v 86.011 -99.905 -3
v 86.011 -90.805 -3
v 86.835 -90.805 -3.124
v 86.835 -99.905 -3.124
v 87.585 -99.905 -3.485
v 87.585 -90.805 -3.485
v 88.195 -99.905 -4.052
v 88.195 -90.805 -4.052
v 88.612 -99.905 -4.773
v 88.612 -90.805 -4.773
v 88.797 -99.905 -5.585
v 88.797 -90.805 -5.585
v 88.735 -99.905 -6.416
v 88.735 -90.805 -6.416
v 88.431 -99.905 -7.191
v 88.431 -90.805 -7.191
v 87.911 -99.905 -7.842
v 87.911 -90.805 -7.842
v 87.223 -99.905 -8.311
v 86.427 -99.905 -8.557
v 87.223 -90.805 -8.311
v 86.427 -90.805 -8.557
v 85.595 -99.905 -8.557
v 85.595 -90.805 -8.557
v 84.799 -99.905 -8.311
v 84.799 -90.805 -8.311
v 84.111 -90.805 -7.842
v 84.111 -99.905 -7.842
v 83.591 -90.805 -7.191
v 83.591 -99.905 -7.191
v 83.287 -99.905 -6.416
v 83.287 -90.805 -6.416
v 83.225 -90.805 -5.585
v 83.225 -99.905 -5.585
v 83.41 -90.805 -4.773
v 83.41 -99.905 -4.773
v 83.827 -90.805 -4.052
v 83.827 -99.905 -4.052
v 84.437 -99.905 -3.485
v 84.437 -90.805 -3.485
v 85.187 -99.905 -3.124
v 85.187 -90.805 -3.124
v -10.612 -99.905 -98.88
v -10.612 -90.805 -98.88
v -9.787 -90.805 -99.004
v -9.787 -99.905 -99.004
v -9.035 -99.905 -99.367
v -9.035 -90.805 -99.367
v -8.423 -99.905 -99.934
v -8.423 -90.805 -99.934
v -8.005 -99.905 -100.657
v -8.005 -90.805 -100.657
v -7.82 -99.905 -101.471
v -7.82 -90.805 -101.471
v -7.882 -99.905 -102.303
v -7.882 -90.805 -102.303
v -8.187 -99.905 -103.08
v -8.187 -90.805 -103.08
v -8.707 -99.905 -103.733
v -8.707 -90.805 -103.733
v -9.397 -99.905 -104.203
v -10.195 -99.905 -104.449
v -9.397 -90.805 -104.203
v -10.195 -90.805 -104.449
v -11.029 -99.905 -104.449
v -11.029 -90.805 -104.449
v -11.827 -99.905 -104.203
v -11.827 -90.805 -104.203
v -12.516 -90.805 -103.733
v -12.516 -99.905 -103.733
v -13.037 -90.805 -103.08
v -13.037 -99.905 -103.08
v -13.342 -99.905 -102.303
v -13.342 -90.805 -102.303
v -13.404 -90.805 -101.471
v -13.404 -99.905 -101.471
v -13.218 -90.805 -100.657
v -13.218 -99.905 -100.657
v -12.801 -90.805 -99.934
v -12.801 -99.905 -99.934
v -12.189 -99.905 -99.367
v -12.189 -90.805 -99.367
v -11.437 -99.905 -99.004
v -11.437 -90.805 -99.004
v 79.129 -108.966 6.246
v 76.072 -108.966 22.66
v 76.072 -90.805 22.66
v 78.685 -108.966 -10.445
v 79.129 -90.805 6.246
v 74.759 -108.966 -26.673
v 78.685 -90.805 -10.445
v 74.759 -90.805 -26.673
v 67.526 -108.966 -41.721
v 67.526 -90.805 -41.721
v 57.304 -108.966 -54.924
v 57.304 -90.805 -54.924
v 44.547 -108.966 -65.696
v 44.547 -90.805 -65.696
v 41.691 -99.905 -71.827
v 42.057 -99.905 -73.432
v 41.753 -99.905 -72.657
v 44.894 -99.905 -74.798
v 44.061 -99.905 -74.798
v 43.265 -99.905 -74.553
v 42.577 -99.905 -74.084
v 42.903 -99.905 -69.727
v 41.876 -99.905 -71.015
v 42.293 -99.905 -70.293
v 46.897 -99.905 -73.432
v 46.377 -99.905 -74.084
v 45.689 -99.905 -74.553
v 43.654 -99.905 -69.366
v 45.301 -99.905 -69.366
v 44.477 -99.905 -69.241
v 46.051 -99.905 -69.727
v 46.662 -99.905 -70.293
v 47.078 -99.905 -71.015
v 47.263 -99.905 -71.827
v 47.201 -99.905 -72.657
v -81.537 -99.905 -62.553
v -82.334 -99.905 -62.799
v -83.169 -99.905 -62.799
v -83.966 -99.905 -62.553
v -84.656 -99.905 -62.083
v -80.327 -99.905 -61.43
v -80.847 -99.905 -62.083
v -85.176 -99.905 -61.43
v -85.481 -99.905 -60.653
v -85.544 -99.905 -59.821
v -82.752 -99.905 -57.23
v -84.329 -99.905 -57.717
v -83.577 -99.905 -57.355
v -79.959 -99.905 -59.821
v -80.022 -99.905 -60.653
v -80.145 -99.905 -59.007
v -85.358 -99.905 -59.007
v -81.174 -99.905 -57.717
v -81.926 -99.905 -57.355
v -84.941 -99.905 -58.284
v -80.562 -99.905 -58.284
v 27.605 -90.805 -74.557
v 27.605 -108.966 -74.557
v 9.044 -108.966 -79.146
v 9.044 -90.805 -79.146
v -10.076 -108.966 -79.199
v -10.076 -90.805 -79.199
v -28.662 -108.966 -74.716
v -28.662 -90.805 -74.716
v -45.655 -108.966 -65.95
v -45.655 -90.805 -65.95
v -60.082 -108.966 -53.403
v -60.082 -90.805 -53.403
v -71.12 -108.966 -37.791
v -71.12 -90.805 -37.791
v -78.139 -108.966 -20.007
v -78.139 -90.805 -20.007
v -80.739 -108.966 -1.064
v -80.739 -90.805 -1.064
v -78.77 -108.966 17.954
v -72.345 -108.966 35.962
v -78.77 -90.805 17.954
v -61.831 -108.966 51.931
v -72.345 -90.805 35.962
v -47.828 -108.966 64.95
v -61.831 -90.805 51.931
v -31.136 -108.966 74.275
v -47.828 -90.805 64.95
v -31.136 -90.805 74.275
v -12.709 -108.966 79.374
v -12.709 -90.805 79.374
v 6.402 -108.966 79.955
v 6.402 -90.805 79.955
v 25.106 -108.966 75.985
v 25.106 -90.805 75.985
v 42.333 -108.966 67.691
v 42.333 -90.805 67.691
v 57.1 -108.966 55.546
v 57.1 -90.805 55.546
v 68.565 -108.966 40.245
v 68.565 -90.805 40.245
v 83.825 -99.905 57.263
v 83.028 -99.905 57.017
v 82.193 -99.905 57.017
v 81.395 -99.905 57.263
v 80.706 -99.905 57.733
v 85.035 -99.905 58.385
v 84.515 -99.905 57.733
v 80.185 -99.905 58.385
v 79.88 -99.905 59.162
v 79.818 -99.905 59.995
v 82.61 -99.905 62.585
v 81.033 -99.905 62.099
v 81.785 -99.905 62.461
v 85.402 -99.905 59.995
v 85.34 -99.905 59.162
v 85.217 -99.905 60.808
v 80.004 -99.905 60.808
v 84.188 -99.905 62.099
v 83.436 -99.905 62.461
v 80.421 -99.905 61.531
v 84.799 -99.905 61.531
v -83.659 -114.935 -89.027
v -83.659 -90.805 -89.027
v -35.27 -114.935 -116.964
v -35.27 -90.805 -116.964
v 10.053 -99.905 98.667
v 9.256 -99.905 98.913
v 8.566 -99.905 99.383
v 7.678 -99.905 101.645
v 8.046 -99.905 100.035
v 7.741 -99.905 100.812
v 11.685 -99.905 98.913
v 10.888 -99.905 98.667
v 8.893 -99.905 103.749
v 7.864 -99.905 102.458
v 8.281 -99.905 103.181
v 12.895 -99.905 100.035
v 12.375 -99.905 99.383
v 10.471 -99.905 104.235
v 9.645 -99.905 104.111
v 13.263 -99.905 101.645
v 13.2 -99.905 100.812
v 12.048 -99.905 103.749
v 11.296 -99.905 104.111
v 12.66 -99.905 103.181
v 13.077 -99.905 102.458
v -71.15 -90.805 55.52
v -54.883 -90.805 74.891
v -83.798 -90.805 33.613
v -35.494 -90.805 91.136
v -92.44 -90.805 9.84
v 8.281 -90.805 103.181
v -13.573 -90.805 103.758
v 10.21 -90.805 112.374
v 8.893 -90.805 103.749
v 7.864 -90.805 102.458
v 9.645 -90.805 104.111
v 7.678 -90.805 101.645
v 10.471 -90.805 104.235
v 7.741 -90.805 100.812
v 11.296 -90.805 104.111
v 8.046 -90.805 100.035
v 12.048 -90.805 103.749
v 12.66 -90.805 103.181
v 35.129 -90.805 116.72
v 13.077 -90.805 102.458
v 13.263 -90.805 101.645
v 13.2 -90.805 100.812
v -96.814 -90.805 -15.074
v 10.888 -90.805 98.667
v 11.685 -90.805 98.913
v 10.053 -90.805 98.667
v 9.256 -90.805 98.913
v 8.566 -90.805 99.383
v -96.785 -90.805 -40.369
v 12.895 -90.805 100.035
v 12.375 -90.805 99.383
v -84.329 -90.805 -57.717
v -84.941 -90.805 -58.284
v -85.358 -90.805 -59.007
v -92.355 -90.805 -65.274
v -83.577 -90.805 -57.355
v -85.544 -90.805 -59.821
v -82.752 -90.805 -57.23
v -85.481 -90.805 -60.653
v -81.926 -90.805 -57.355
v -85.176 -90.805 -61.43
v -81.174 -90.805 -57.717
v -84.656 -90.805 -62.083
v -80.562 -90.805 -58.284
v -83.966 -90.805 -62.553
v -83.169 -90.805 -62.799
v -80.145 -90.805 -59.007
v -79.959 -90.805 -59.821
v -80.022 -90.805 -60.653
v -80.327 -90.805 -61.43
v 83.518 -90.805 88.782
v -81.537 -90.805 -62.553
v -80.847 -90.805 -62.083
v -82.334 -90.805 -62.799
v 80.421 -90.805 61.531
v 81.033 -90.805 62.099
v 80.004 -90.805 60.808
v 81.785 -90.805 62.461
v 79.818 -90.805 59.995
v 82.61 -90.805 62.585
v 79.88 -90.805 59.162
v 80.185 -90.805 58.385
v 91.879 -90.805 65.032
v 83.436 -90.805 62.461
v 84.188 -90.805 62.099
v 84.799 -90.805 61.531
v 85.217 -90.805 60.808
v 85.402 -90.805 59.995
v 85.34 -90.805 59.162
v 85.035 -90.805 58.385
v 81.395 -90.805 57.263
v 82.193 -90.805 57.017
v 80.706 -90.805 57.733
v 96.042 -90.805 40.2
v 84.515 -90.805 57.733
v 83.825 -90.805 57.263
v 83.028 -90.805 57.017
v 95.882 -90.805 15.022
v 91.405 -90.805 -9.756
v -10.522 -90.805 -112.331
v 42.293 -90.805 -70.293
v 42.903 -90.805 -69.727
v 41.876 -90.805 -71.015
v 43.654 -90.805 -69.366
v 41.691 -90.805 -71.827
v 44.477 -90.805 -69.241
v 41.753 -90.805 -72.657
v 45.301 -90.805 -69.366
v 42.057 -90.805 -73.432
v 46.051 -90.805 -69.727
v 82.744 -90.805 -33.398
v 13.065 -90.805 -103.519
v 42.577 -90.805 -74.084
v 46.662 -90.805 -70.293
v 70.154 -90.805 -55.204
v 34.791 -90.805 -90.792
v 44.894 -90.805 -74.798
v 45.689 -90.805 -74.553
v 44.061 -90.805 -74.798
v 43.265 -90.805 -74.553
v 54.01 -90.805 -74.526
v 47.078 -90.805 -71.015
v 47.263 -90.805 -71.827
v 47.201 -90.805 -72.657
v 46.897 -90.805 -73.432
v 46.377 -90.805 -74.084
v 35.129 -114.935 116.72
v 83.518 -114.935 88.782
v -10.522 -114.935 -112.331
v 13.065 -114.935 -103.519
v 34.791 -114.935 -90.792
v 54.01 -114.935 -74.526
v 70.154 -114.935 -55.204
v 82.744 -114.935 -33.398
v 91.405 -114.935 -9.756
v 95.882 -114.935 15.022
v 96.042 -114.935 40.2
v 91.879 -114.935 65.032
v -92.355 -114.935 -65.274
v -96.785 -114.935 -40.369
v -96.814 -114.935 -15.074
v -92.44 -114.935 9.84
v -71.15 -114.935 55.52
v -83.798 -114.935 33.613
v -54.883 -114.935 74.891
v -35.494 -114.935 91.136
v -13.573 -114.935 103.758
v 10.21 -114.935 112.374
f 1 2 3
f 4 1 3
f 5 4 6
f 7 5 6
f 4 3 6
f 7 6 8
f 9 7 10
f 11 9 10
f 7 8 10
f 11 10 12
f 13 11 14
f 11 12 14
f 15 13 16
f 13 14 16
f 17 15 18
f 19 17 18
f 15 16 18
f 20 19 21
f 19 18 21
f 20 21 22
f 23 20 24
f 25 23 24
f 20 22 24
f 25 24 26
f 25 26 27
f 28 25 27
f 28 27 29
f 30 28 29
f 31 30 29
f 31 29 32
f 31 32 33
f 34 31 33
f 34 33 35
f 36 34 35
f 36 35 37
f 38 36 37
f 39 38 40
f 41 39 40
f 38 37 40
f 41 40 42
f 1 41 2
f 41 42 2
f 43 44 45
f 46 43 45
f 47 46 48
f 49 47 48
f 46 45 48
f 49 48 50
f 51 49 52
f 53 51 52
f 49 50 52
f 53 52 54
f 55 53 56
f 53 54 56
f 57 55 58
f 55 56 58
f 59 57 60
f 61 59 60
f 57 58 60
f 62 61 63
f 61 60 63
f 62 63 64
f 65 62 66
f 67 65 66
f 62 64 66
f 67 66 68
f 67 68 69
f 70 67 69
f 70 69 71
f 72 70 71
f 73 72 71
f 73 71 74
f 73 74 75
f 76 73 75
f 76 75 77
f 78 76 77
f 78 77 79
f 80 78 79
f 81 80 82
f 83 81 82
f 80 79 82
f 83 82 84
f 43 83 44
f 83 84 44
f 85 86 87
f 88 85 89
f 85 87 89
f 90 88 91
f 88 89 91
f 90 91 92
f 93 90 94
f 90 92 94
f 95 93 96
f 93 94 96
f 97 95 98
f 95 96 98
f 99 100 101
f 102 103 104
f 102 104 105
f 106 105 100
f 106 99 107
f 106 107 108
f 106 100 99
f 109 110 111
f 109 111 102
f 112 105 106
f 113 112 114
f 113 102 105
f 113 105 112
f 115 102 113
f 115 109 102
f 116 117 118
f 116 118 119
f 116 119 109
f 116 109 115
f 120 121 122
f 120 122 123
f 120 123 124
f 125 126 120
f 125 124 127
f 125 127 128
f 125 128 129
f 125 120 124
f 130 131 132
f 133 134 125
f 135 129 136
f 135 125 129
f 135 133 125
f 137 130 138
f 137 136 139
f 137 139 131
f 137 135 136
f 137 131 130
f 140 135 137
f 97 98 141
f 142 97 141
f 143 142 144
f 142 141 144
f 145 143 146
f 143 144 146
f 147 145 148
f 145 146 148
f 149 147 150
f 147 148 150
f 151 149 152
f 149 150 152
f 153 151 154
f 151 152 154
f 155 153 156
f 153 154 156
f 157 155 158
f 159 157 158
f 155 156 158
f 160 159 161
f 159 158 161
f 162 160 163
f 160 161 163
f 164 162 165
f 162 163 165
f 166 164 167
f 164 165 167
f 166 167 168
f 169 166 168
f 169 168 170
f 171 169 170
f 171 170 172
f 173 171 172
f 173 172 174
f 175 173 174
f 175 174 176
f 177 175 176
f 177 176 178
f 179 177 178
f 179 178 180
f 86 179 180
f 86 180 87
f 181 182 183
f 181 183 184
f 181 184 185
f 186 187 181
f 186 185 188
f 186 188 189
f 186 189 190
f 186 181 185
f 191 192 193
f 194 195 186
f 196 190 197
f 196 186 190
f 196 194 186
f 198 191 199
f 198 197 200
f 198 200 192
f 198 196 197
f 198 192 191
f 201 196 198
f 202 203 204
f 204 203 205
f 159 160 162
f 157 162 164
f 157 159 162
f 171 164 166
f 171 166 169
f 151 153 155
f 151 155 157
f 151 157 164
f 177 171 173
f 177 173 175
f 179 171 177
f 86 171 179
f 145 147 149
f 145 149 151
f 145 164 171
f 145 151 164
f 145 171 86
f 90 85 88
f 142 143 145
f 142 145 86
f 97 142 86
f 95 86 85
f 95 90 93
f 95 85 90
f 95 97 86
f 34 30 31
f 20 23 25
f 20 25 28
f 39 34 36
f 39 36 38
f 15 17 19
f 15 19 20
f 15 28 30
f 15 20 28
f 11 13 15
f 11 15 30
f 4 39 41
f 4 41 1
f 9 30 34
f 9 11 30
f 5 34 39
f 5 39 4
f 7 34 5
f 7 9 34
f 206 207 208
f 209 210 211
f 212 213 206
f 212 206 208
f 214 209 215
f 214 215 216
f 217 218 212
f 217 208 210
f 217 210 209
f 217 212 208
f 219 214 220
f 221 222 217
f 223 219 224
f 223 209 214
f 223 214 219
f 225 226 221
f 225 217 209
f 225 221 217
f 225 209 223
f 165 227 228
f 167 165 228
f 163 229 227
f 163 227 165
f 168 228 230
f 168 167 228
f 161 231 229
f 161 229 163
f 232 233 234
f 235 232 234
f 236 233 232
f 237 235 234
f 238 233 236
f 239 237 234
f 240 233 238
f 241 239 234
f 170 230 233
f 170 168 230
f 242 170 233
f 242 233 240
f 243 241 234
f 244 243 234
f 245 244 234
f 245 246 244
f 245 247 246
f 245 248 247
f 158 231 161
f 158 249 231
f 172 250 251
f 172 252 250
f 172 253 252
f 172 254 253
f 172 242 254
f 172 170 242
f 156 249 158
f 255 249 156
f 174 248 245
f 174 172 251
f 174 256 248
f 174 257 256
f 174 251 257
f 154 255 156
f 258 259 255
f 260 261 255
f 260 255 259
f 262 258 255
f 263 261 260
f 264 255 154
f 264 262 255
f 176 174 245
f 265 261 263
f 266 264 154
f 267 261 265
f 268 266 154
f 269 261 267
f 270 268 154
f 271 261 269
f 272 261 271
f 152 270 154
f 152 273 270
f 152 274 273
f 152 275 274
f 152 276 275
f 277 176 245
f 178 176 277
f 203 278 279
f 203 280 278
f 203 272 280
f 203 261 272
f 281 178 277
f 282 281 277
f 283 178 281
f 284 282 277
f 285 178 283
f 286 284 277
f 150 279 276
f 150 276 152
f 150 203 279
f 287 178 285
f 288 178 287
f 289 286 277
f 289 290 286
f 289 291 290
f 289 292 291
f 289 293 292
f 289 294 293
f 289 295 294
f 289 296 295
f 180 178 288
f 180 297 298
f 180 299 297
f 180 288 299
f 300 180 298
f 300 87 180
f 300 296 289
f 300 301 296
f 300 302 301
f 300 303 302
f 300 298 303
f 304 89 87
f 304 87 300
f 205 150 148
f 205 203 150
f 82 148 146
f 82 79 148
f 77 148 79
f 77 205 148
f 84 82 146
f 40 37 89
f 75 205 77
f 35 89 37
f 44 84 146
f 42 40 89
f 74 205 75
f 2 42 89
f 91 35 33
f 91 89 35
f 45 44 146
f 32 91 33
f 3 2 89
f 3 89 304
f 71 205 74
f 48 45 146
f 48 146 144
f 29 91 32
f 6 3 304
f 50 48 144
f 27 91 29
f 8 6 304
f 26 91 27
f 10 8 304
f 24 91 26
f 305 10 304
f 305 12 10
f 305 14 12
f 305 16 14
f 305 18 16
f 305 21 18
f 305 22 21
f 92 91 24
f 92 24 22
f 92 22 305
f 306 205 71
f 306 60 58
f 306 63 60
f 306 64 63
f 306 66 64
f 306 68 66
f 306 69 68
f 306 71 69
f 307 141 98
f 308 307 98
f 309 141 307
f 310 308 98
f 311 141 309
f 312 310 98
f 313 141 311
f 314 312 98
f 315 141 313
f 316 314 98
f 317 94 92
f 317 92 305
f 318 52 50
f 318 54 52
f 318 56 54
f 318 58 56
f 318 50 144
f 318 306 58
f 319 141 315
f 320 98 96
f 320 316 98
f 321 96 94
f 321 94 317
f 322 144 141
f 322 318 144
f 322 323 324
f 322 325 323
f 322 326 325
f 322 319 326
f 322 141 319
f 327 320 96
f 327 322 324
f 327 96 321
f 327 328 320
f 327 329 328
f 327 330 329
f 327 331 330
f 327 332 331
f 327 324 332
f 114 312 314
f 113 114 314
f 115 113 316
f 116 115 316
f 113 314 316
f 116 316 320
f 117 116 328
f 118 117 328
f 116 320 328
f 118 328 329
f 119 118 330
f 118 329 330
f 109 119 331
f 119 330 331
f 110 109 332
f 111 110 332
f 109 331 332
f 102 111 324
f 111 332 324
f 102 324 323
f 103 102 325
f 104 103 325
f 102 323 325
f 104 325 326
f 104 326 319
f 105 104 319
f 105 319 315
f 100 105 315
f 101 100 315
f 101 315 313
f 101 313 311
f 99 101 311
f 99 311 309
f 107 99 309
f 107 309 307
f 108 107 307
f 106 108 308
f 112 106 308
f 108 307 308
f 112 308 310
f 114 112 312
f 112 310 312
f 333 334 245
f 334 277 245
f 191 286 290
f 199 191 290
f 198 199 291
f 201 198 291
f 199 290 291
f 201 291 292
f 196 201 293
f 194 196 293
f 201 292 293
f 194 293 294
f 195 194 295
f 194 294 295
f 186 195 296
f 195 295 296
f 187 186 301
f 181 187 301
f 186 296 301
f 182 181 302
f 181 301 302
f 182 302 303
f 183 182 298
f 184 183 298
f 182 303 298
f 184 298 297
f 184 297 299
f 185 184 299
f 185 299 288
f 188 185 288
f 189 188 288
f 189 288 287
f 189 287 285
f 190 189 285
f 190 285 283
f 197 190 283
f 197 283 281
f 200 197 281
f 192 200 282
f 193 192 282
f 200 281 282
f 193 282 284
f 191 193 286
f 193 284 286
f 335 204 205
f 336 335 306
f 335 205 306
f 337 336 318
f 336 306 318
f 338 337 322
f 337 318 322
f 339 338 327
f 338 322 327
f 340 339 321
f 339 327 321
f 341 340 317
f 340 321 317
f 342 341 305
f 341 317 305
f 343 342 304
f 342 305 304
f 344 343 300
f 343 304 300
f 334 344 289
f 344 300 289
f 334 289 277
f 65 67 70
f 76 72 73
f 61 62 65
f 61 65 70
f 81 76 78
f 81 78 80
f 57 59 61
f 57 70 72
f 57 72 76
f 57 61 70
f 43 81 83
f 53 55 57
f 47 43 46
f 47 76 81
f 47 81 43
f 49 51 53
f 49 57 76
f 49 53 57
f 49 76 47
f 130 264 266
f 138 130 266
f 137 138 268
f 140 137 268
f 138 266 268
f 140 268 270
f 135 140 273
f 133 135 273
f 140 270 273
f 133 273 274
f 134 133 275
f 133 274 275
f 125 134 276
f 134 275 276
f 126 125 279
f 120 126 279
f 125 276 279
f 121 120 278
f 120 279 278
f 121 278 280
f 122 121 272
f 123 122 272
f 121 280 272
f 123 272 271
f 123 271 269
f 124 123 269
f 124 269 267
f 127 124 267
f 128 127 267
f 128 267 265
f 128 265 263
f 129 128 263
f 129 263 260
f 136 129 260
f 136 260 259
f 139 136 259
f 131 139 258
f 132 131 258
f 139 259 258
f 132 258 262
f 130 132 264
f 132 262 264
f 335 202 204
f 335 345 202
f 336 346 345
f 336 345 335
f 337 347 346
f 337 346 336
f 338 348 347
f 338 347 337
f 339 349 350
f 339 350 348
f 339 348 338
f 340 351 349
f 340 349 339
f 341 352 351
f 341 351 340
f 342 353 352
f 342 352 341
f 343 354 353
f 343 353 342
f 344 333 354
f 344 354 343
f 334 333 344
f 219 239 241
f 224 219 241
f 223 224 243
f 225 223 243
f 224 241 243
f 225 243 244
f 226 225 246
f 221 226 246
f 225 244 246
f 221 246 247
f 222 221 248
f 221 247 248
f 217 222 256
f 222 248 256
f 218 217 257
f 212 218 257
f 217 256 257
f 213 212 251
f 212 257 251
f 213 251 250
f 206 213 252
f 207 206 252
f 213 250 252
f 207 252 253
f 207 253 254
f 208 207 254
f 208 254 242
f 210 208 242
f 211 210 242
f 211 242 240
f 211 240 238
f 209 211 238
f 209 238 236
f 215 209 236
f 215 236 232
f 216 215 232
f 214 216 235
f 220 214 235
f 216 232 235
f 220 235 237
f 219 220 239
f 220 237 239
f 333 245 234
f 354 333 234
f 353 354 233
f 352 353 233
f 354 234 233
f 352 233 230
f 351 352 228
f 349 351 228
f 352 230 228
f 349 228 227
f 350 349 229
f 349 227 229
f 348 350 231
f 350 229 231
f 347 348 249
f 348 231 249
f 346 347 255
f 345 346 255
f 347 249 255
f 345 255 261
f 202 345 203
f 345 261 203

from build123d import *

# Parameters (mm, degrees)
BOSS_EXTRUDE1_DEPTH      = 8.255
SKETCH2_R                = 4.52165068
CUT_EXTRUDE1_DEPTH       = 24.892
BOSS_EXTRUDE2_DEPTH      = 2.54
BOSS_EXTRUDE2_DEPTH_BACK = 19.05
BOSS_EXTRUDE3_DEPTH      = 55.87439679
SKETCH8_W                = 306.493093546
SKETCH8_H                = 19.05
BOSS_EXTRUDE4_DEPTH      = 55.87439679
SKETCH9_R                = 88.9
BOSS_EXTRUDE5_DEPTH      = 19.05
SKETCH10_W               = 191.766813877
SKETCH10_H               = 13.52799874
BOSS_EXTRUDE6_DEPTH      = 55.87439679
SKETCH12_R               = 1.75
CUT_EXTRUDE3_DEPTH       = 25.146
SKETCH14_R               = 12.700759967
CUT_EXTRUDE4_DEPTH       = 30.48
CUT_EXTRUDE5_DEPTH       = 55.118
SKETCH16_R               = 79.375
CUT_EXTRUDE6_DEPTH       = 16.129
CUT_EXTRUDE7_DEPTH       = 8.89
CUT_EXTRUDE8_DEPTH       = 2.54
SKETCH19_W               = 282.174011185
SKETCH19_H               = 80.01
CUT_EXTRUDE9_DEPTH       = 75.946
SKETCH20_R               = 79.375
BOSS_EXTRUDE7_DEPTH      = 19.05
SKETCH21_R               = 2.8
SKETCH21_R_2             = 2.794
CUT_EXTRUDE10_DEPTH      = 9.1
SKETCH22_R               = 79.375
CUT_EXTRUDE11_DEPTH      = 18.161
BOSS_EXTRUDE8_DEPTH      = 5.08
SKETCH24_R               = 80.01
CUT_EXTRUDE12_DEPTH      = 18.161


with BuildPart() as part:
    # Sketch1 → Boss-Extrude1 (new, symmetric)
    with BuildSketch(Plane(origin=(0, 0, 0), x_dir=(1, 0, 0), z_dir=(0, 1, 0))):
        Polygon((-26.685513069, 19.73834527), (-3.435840979, 33.16154971), (26.859514241, -19.311544765), (3.609842152, -32.734749204), align=None)
    extrude(amount=BOSS_EXTRUDE1_DEPTH, both=True)

    # Sketch2 → Cut-Extrude1 (cut)
    with BuildSketch(Plane(origin=(0, 8.255, 0), x_dir=(1, 0, 0), z_dir=(0, 1, 0))):
        with Locations(Location((0, 0, 0), (0, 0, 270))):
            Circle(SKETCH2_R)
    extrude(amount=-CUT_EXTRUDE1_DEPTH, mode=Mode.SUBTRACT)

    # Sketch12 → Cut-Extrude3 (cut)
    with BuildSketch(Plane(origin=(0, 8.255, 0), x_dir=(1, 0, 0), z_dir=(0, 1, 0))):
        with Locations(Location((-3.182842434, 15.553762143, 0), (0, 0, 270))):
            Circle(SKETCH12_R)
        with Locations(Location((3.182843419, -15.553761764, 0), (0, 0, 270))):
            Circle(SKETCH12_R)
        with Locations(Location((-11.87853102, 10.533303997, 0), (0, 0, 270))):
            Circle(SKETCH12_R)
        with Locations(Location((11.878532006, -10.533303617, 0), (0, 0, 270))):
            Circle(SKETCH12_R)
    extrude(amount=-CUT_EXTRUDE3_DEPTH, mode=Mode.SUBTRACT)


with BuildPart() as body_2:
    # Sketch3 → Boss-Extrude2 (new, two sides: drawn at the far end of the back side and taken through both)
    with BuildSketch(Plane(origin=(0, 8.255, 0), x_dir=(1, 0, 0), z_dir=(0, 1, 0)).offset(-BOSS_EXTRUDE2_DEPTH_BACK)):
        Polygon((-10.314271596, 73.739239236), (-58.702918637, 45.802040841), (10.314271596, -73.739239236), (58.702918637, -45.802040841), align=None)
        Polygon((-26.685513069, 19.73834527), (3.609842152, -32.734749204), (26.859514241, -19.311544765), (-3.435840979, 33.16154971), align=None, mode=Mode.SUBTRACT)
    extrude(amount=BOSS_EXTRUDE2_DEPTH + BOSS_EXTRUDE2_DEPTH_BACK)

    # Sketch7 → Boss-Extrude3 (add)
    with BuildSketch(Plane(origin=(-24.19432352, 0, 13.968599197), x_dir=(0.5000000000000003, 0, 0.8660254037844384), z_dir=(-0.8660254037844385, 0, 0.5000000000000004))):
        Polygon((-90.607190232, 10.795), (-118.92932164, -90.805), (-97.33932164, -90.805), (-69.017190232, -10.795), (-69.017190232, 10.795), align=None)
    boss_extrude3 = extrude(amount=-BOSS_EXTRUDE3_DEPTH)

    # Sketch8 → Boss-Extrude4 (add)
    with BuildSketch(Plane(origin=(-24.19432352, 0, 13.968599197), x_dir=(0.5000000000000003, 0, 0.8660254037844384), z_dir=(-0.8660254037844385, 0, 0.5000000000000004))):
        with Locations((0, -100.33)):
            Rectangle(SKETCH8_W, SKETCH8_H)
    extrude(amount=-BOSS_EXTRUDE4_DEPTH)

    # Mirror1: Boss-Extrude3 across plane
    add(boss_extrude3.mirror(Plane(origin=(-0.070654873, 0, -0.122377831), x_dir=(-0.8660254037844366, 0, 0.5000000000000038), z_dir=(0.5000000000000041, 0, 0.8660254037844364))))

    # Sketch9 → Boss-Extrude5 (add)
    with BuildSketch(Plane(origin=(0, -90.805, 0), x_dir=(1, 0, 0), z_dir=(0, 1, 0))):
        Circle(SKETCH9_R)
    extrude(amount=-BOSS_EXTRUDE5_DEPTH)

    # Sketch10 → Boss-Extrude6 (add)
    with BuildSketch(Plane(origin=(-24.19432352, 0, 13.968599197), x_dir=(0.5000000000000047, 0, 0.866025403784436), z_dir=(-0.866025403784436, 0, 0.5000000000000047))):
        with Locations((-2.1166315, -68.398848488)):
            Rectangle(SKETCH10_W, SKETCH10_H)
    extrude(amount=-BOSS_EXTRUDE6_DEPTH)

    # Sketch14 → Cut-Extrude4 (cut)
    with BuildSketch(Plane(origin=(0, 10.795, 0), x_dir=(1, 0, 0), z_dir=(0, 1, 0))):
        with Locations(Location((24.120133011, -48.16621031, 0), (0, 0, 270))):
            Circle(SKETCH14_R)
    cut_extrude4 = extrude(amount=-CUT_EXTRUDE4_DEPTH, mode=Mode.SUBTRACT)

    # Mirror2: Cut-Extrude4 across plane
    add(cut_extrude4.mirror(Plane(origin=(-0.070654873, 0, -0.122377831), x_dir=(-0.8660254037844366, 0, 0.5000000000000038), z_dir=(0.5000000000000041, 0, 0.8660254037844364))), mode=Mode.SUBTRACT)

    # Sketch15 → Cut-Extrude5 (cut)
    with BuildSketch(Plane(origin=(0, -90.805, 0), x_dir=(1, 0, 0), z_dir=(0, 1, 0))):
        Polygon((100.817596907, -118.746803351), (83.517674594, -88.782458937), (35.129027553, -116.719657331), (52.428949866, -146.684001745), align=None)
        Polygon((-83.658984341, 89.027214598), (-35.2703373, 116.964412993), (-52.428949866, 146.684001745), (-100.817596907, 118.746803351), align=None)
    extrude(amount=-CUT_EXTRUDE5_DEPTH, mode=Mode.SUBTRACT)

    # Sketch16 → Cut-Extrude6 (cut)
    with BuildSketch(Plane(origin=(0, -90.805, 0), x_dir=(1, 0, 0), z_dir=(0, 1, 0))):
        with Locations(Location((0, 0, 0), (0, 0, 270))):
            Circle(SKETCH16_R)
    extrude(amount=-CUT_EXTRUDE6_DEPTH, mode=Mode.SUBTRACT)


with BuildPart() as cut_extrude7_tool:
    # Sketch17 → Cut-Extrude7 (new body)
    with BuildSketch(Plane(origin=(0, 10.795, 0), x_dir=(1, 0, 0), z_dir=(0, 1, 0))):
        Polygon((27.82393906, -104.066872908), (76.212586101, -76.129674513), (-31.017857396, 109.598901741), (-79.406504437, 81.661703346), align=None)
    extrude(amount=-CUT_EXTRUDE7_DEPTH)


with BuildPart() as part_1:
    add(part.part)

    # Cut-Extrude7: cut by cut_extrude7_tool
    add(cut_extrude7_tool.part, mode=Mode.SUBTRACT)

    # Sketch18 → Cut-Extrude8 (cut)
    with BuildSketch(Plane(origin=(0, 1.905, 0), x_dir=(1, 0, 0), z_dir=(0, 1, 0))):
        Polygon((-26.685513069, 19.73834527), (3.609842152, -32.734749204), (26.859514241, -19.311544765), (-3.435840979, 33.16154971), align=None)
    extrude(amount=-CUT_EXTRUDE8_DEPTH, mode=Mode.SUBTRACT)


with BuildPart() as body_2_1:
    add(body_2.part)

    # Cut-Extrude7: cut by cut_extrude7_tool
    add(cut_extrude7_tool.part, mode=Mode.SUBTRACT)

    # Sketch19 → Cut-Extrude9 (cut)
    with BuildSketch(Plane(origin=(-24.19432352, 0, 13.968599197), x_dir=(0.5000000000000047, 0, 0.866025403784436), z_dir=(-0.866025403784436, 0, 0.5000000000000047))):
        with Locations((-0.70763264, -50.8)):
            Rectangle(SKETCH19_W, SKETCH19_H)
    extrude(amount=-CUT_EXTRUDE9_DEPTH, mode=Mode.SUBTRACT)


with BuildPart() as cut_extrude9_piece_1:
    # of the separate pieces the step leaves, piece 1, a body of its own (cut_extrude9_pieces)
    add(body_2_1.part.solids().sort_by_distance((-83.658984341, -90.805, -89.027214598))[0])

    # Sketch20 → Boss-Extrude7 (add)
    with BuildSketch(Plane.XZ.offset(109.855)):
        with BuildLine():
            Line((-83.658984341, -89.027214598), (-35.2703373, -116.964412993))
            ThreePointArc((-35.2703373, -116.964412993), (76.919154391, -44.572464934), (83.517674594, 88.782458937))
            Line((83.517674594, 88.782458937), (35.129027553, 116.719657331))
            ThreePointArc((35.129027553, 116.719657331), (-77.953106839, 44.843076777), (-83.658984341, -89.027214598))
        make_face()
        with Locations(Location((0, 0, 0), (0, 0, 90))):
            Circle(SKETCH20_R, mode=Mode.SUBTRACT)
    extrude(amount=-BOSS_EXTRUDE7_DEPTH)

    # Sketch21 → Cut-Extrude10 (cut)
    with BuildSketch(Plane(origin=(0, -90.805, 0), x_dir=(1, 0, 0), z_dir=(0, 1, 0))):
        with Locations(Location((-10.611856409, 101.680071559, 0), (0, 0, 270))):
            Circle(SKETCH21_R)
        with Locations(Location((-82.751596824, 60.030173011, 0), (0, 0, 270))):
            Circle(SKETCH21_R)
        with Locations(Location((82.610287077, -59.78541735, 0), (0, 0, 270))):
            Circle(SKETCH21_R)
        with Locations(Location((10.470546662, -101.435315897, 0), (0, 0, 270))):
            Circle(SKETCH21_R)
        with Locations(Location((44.477086399, 72.035469588, 0), (0, 0, 270))):
            Circle(SKETCH21_R_2)
        with Locations(Location((86.011031333, 5.793902801, 0), (0, 0, 270))):
            Circle(SKETCH21_R_2)
    extrude(amount=-CUT_EXTRUDE10_DEPTH, mode=Mode.SUBTRACT)

    # Sketch22 → Cut-Extrude11 (cut)
    with BuildSketch(Plane(origin=(0, -90.805, 0), x_dir=(1, 0, 0), z_dir=(0, 1, 0))):
        with Locations(Location((0, 0, 0), (0, 0, 270))):
            Circle(SKETCH22_R)
    extrude(amount=-CUT_EXTRUDE11_DEPTH, mode=Mode.SUBTRACT)

    # Sketch23 → Boss-Extrude8 (add)
    with BuildSketch(Plane.XZ.offset(109.855)):
        with BuildLine():
            Line((-83.658984341, -89.027214598), (-35.2703373, -116.964412993))
            ThreePointArc((-35.2703373, -116.964412993), (76.919154391, -44.572464934), (83.517674594, 88.782458937))
            Line((83.517674594, 88.782458937), (35.129027553, 116.719657331))
            ThreePointArc((35.129027553, 116.719657331), (-77.953106839, 44.843076777), (-83.658984341, -89.027214598))
        make_face()
    extrude(amount=BOSS_EXTRUDE8_DEPTH)

    # Sketch24 → Cut-Extrude12 (cut)
    with BuildSketch(Plane(origin=(0, -90.805, 0), x_dir=(1, 0, 0), z_dir=(0, 1, 0))):
        with Locations((-0.739793922, -0.263949779)):
            Circle(SKETCH24_R)
    extrude(amount=-CUT_EXTRUDE12_DEPTH, mode=Mode.SUBTRACT)


with BuildPart() as cut_extrude9_piece_2:
    # of the separate pieces the step leaves, piece 2, a body of its own (cut_extrude9_pieces)
    add(body_2_1.part.solids().sort_by_distance((-70.737011886, 1.905, -66.645701772))[0])


with BuildPart() as cut_extrude9_piece_2_1:
    # Body-Move/Copy1: moved
    add(cut_extrude9_piece_2.part.moved(Location((0, -38.1, 0))))


with BuildPart() as part_2:
    # Body-Move/Copy1: moved
    add(part_1.part.moved(Location((0, -38.1, 0))))


with BuildPart() as cut_extrude9_piece_2_2:
    add(cut_extrude9_piece_2_1.part)

    # Combine1: union part
    add(part_2.part)


solid = cut_extrude9_piece_1.part
